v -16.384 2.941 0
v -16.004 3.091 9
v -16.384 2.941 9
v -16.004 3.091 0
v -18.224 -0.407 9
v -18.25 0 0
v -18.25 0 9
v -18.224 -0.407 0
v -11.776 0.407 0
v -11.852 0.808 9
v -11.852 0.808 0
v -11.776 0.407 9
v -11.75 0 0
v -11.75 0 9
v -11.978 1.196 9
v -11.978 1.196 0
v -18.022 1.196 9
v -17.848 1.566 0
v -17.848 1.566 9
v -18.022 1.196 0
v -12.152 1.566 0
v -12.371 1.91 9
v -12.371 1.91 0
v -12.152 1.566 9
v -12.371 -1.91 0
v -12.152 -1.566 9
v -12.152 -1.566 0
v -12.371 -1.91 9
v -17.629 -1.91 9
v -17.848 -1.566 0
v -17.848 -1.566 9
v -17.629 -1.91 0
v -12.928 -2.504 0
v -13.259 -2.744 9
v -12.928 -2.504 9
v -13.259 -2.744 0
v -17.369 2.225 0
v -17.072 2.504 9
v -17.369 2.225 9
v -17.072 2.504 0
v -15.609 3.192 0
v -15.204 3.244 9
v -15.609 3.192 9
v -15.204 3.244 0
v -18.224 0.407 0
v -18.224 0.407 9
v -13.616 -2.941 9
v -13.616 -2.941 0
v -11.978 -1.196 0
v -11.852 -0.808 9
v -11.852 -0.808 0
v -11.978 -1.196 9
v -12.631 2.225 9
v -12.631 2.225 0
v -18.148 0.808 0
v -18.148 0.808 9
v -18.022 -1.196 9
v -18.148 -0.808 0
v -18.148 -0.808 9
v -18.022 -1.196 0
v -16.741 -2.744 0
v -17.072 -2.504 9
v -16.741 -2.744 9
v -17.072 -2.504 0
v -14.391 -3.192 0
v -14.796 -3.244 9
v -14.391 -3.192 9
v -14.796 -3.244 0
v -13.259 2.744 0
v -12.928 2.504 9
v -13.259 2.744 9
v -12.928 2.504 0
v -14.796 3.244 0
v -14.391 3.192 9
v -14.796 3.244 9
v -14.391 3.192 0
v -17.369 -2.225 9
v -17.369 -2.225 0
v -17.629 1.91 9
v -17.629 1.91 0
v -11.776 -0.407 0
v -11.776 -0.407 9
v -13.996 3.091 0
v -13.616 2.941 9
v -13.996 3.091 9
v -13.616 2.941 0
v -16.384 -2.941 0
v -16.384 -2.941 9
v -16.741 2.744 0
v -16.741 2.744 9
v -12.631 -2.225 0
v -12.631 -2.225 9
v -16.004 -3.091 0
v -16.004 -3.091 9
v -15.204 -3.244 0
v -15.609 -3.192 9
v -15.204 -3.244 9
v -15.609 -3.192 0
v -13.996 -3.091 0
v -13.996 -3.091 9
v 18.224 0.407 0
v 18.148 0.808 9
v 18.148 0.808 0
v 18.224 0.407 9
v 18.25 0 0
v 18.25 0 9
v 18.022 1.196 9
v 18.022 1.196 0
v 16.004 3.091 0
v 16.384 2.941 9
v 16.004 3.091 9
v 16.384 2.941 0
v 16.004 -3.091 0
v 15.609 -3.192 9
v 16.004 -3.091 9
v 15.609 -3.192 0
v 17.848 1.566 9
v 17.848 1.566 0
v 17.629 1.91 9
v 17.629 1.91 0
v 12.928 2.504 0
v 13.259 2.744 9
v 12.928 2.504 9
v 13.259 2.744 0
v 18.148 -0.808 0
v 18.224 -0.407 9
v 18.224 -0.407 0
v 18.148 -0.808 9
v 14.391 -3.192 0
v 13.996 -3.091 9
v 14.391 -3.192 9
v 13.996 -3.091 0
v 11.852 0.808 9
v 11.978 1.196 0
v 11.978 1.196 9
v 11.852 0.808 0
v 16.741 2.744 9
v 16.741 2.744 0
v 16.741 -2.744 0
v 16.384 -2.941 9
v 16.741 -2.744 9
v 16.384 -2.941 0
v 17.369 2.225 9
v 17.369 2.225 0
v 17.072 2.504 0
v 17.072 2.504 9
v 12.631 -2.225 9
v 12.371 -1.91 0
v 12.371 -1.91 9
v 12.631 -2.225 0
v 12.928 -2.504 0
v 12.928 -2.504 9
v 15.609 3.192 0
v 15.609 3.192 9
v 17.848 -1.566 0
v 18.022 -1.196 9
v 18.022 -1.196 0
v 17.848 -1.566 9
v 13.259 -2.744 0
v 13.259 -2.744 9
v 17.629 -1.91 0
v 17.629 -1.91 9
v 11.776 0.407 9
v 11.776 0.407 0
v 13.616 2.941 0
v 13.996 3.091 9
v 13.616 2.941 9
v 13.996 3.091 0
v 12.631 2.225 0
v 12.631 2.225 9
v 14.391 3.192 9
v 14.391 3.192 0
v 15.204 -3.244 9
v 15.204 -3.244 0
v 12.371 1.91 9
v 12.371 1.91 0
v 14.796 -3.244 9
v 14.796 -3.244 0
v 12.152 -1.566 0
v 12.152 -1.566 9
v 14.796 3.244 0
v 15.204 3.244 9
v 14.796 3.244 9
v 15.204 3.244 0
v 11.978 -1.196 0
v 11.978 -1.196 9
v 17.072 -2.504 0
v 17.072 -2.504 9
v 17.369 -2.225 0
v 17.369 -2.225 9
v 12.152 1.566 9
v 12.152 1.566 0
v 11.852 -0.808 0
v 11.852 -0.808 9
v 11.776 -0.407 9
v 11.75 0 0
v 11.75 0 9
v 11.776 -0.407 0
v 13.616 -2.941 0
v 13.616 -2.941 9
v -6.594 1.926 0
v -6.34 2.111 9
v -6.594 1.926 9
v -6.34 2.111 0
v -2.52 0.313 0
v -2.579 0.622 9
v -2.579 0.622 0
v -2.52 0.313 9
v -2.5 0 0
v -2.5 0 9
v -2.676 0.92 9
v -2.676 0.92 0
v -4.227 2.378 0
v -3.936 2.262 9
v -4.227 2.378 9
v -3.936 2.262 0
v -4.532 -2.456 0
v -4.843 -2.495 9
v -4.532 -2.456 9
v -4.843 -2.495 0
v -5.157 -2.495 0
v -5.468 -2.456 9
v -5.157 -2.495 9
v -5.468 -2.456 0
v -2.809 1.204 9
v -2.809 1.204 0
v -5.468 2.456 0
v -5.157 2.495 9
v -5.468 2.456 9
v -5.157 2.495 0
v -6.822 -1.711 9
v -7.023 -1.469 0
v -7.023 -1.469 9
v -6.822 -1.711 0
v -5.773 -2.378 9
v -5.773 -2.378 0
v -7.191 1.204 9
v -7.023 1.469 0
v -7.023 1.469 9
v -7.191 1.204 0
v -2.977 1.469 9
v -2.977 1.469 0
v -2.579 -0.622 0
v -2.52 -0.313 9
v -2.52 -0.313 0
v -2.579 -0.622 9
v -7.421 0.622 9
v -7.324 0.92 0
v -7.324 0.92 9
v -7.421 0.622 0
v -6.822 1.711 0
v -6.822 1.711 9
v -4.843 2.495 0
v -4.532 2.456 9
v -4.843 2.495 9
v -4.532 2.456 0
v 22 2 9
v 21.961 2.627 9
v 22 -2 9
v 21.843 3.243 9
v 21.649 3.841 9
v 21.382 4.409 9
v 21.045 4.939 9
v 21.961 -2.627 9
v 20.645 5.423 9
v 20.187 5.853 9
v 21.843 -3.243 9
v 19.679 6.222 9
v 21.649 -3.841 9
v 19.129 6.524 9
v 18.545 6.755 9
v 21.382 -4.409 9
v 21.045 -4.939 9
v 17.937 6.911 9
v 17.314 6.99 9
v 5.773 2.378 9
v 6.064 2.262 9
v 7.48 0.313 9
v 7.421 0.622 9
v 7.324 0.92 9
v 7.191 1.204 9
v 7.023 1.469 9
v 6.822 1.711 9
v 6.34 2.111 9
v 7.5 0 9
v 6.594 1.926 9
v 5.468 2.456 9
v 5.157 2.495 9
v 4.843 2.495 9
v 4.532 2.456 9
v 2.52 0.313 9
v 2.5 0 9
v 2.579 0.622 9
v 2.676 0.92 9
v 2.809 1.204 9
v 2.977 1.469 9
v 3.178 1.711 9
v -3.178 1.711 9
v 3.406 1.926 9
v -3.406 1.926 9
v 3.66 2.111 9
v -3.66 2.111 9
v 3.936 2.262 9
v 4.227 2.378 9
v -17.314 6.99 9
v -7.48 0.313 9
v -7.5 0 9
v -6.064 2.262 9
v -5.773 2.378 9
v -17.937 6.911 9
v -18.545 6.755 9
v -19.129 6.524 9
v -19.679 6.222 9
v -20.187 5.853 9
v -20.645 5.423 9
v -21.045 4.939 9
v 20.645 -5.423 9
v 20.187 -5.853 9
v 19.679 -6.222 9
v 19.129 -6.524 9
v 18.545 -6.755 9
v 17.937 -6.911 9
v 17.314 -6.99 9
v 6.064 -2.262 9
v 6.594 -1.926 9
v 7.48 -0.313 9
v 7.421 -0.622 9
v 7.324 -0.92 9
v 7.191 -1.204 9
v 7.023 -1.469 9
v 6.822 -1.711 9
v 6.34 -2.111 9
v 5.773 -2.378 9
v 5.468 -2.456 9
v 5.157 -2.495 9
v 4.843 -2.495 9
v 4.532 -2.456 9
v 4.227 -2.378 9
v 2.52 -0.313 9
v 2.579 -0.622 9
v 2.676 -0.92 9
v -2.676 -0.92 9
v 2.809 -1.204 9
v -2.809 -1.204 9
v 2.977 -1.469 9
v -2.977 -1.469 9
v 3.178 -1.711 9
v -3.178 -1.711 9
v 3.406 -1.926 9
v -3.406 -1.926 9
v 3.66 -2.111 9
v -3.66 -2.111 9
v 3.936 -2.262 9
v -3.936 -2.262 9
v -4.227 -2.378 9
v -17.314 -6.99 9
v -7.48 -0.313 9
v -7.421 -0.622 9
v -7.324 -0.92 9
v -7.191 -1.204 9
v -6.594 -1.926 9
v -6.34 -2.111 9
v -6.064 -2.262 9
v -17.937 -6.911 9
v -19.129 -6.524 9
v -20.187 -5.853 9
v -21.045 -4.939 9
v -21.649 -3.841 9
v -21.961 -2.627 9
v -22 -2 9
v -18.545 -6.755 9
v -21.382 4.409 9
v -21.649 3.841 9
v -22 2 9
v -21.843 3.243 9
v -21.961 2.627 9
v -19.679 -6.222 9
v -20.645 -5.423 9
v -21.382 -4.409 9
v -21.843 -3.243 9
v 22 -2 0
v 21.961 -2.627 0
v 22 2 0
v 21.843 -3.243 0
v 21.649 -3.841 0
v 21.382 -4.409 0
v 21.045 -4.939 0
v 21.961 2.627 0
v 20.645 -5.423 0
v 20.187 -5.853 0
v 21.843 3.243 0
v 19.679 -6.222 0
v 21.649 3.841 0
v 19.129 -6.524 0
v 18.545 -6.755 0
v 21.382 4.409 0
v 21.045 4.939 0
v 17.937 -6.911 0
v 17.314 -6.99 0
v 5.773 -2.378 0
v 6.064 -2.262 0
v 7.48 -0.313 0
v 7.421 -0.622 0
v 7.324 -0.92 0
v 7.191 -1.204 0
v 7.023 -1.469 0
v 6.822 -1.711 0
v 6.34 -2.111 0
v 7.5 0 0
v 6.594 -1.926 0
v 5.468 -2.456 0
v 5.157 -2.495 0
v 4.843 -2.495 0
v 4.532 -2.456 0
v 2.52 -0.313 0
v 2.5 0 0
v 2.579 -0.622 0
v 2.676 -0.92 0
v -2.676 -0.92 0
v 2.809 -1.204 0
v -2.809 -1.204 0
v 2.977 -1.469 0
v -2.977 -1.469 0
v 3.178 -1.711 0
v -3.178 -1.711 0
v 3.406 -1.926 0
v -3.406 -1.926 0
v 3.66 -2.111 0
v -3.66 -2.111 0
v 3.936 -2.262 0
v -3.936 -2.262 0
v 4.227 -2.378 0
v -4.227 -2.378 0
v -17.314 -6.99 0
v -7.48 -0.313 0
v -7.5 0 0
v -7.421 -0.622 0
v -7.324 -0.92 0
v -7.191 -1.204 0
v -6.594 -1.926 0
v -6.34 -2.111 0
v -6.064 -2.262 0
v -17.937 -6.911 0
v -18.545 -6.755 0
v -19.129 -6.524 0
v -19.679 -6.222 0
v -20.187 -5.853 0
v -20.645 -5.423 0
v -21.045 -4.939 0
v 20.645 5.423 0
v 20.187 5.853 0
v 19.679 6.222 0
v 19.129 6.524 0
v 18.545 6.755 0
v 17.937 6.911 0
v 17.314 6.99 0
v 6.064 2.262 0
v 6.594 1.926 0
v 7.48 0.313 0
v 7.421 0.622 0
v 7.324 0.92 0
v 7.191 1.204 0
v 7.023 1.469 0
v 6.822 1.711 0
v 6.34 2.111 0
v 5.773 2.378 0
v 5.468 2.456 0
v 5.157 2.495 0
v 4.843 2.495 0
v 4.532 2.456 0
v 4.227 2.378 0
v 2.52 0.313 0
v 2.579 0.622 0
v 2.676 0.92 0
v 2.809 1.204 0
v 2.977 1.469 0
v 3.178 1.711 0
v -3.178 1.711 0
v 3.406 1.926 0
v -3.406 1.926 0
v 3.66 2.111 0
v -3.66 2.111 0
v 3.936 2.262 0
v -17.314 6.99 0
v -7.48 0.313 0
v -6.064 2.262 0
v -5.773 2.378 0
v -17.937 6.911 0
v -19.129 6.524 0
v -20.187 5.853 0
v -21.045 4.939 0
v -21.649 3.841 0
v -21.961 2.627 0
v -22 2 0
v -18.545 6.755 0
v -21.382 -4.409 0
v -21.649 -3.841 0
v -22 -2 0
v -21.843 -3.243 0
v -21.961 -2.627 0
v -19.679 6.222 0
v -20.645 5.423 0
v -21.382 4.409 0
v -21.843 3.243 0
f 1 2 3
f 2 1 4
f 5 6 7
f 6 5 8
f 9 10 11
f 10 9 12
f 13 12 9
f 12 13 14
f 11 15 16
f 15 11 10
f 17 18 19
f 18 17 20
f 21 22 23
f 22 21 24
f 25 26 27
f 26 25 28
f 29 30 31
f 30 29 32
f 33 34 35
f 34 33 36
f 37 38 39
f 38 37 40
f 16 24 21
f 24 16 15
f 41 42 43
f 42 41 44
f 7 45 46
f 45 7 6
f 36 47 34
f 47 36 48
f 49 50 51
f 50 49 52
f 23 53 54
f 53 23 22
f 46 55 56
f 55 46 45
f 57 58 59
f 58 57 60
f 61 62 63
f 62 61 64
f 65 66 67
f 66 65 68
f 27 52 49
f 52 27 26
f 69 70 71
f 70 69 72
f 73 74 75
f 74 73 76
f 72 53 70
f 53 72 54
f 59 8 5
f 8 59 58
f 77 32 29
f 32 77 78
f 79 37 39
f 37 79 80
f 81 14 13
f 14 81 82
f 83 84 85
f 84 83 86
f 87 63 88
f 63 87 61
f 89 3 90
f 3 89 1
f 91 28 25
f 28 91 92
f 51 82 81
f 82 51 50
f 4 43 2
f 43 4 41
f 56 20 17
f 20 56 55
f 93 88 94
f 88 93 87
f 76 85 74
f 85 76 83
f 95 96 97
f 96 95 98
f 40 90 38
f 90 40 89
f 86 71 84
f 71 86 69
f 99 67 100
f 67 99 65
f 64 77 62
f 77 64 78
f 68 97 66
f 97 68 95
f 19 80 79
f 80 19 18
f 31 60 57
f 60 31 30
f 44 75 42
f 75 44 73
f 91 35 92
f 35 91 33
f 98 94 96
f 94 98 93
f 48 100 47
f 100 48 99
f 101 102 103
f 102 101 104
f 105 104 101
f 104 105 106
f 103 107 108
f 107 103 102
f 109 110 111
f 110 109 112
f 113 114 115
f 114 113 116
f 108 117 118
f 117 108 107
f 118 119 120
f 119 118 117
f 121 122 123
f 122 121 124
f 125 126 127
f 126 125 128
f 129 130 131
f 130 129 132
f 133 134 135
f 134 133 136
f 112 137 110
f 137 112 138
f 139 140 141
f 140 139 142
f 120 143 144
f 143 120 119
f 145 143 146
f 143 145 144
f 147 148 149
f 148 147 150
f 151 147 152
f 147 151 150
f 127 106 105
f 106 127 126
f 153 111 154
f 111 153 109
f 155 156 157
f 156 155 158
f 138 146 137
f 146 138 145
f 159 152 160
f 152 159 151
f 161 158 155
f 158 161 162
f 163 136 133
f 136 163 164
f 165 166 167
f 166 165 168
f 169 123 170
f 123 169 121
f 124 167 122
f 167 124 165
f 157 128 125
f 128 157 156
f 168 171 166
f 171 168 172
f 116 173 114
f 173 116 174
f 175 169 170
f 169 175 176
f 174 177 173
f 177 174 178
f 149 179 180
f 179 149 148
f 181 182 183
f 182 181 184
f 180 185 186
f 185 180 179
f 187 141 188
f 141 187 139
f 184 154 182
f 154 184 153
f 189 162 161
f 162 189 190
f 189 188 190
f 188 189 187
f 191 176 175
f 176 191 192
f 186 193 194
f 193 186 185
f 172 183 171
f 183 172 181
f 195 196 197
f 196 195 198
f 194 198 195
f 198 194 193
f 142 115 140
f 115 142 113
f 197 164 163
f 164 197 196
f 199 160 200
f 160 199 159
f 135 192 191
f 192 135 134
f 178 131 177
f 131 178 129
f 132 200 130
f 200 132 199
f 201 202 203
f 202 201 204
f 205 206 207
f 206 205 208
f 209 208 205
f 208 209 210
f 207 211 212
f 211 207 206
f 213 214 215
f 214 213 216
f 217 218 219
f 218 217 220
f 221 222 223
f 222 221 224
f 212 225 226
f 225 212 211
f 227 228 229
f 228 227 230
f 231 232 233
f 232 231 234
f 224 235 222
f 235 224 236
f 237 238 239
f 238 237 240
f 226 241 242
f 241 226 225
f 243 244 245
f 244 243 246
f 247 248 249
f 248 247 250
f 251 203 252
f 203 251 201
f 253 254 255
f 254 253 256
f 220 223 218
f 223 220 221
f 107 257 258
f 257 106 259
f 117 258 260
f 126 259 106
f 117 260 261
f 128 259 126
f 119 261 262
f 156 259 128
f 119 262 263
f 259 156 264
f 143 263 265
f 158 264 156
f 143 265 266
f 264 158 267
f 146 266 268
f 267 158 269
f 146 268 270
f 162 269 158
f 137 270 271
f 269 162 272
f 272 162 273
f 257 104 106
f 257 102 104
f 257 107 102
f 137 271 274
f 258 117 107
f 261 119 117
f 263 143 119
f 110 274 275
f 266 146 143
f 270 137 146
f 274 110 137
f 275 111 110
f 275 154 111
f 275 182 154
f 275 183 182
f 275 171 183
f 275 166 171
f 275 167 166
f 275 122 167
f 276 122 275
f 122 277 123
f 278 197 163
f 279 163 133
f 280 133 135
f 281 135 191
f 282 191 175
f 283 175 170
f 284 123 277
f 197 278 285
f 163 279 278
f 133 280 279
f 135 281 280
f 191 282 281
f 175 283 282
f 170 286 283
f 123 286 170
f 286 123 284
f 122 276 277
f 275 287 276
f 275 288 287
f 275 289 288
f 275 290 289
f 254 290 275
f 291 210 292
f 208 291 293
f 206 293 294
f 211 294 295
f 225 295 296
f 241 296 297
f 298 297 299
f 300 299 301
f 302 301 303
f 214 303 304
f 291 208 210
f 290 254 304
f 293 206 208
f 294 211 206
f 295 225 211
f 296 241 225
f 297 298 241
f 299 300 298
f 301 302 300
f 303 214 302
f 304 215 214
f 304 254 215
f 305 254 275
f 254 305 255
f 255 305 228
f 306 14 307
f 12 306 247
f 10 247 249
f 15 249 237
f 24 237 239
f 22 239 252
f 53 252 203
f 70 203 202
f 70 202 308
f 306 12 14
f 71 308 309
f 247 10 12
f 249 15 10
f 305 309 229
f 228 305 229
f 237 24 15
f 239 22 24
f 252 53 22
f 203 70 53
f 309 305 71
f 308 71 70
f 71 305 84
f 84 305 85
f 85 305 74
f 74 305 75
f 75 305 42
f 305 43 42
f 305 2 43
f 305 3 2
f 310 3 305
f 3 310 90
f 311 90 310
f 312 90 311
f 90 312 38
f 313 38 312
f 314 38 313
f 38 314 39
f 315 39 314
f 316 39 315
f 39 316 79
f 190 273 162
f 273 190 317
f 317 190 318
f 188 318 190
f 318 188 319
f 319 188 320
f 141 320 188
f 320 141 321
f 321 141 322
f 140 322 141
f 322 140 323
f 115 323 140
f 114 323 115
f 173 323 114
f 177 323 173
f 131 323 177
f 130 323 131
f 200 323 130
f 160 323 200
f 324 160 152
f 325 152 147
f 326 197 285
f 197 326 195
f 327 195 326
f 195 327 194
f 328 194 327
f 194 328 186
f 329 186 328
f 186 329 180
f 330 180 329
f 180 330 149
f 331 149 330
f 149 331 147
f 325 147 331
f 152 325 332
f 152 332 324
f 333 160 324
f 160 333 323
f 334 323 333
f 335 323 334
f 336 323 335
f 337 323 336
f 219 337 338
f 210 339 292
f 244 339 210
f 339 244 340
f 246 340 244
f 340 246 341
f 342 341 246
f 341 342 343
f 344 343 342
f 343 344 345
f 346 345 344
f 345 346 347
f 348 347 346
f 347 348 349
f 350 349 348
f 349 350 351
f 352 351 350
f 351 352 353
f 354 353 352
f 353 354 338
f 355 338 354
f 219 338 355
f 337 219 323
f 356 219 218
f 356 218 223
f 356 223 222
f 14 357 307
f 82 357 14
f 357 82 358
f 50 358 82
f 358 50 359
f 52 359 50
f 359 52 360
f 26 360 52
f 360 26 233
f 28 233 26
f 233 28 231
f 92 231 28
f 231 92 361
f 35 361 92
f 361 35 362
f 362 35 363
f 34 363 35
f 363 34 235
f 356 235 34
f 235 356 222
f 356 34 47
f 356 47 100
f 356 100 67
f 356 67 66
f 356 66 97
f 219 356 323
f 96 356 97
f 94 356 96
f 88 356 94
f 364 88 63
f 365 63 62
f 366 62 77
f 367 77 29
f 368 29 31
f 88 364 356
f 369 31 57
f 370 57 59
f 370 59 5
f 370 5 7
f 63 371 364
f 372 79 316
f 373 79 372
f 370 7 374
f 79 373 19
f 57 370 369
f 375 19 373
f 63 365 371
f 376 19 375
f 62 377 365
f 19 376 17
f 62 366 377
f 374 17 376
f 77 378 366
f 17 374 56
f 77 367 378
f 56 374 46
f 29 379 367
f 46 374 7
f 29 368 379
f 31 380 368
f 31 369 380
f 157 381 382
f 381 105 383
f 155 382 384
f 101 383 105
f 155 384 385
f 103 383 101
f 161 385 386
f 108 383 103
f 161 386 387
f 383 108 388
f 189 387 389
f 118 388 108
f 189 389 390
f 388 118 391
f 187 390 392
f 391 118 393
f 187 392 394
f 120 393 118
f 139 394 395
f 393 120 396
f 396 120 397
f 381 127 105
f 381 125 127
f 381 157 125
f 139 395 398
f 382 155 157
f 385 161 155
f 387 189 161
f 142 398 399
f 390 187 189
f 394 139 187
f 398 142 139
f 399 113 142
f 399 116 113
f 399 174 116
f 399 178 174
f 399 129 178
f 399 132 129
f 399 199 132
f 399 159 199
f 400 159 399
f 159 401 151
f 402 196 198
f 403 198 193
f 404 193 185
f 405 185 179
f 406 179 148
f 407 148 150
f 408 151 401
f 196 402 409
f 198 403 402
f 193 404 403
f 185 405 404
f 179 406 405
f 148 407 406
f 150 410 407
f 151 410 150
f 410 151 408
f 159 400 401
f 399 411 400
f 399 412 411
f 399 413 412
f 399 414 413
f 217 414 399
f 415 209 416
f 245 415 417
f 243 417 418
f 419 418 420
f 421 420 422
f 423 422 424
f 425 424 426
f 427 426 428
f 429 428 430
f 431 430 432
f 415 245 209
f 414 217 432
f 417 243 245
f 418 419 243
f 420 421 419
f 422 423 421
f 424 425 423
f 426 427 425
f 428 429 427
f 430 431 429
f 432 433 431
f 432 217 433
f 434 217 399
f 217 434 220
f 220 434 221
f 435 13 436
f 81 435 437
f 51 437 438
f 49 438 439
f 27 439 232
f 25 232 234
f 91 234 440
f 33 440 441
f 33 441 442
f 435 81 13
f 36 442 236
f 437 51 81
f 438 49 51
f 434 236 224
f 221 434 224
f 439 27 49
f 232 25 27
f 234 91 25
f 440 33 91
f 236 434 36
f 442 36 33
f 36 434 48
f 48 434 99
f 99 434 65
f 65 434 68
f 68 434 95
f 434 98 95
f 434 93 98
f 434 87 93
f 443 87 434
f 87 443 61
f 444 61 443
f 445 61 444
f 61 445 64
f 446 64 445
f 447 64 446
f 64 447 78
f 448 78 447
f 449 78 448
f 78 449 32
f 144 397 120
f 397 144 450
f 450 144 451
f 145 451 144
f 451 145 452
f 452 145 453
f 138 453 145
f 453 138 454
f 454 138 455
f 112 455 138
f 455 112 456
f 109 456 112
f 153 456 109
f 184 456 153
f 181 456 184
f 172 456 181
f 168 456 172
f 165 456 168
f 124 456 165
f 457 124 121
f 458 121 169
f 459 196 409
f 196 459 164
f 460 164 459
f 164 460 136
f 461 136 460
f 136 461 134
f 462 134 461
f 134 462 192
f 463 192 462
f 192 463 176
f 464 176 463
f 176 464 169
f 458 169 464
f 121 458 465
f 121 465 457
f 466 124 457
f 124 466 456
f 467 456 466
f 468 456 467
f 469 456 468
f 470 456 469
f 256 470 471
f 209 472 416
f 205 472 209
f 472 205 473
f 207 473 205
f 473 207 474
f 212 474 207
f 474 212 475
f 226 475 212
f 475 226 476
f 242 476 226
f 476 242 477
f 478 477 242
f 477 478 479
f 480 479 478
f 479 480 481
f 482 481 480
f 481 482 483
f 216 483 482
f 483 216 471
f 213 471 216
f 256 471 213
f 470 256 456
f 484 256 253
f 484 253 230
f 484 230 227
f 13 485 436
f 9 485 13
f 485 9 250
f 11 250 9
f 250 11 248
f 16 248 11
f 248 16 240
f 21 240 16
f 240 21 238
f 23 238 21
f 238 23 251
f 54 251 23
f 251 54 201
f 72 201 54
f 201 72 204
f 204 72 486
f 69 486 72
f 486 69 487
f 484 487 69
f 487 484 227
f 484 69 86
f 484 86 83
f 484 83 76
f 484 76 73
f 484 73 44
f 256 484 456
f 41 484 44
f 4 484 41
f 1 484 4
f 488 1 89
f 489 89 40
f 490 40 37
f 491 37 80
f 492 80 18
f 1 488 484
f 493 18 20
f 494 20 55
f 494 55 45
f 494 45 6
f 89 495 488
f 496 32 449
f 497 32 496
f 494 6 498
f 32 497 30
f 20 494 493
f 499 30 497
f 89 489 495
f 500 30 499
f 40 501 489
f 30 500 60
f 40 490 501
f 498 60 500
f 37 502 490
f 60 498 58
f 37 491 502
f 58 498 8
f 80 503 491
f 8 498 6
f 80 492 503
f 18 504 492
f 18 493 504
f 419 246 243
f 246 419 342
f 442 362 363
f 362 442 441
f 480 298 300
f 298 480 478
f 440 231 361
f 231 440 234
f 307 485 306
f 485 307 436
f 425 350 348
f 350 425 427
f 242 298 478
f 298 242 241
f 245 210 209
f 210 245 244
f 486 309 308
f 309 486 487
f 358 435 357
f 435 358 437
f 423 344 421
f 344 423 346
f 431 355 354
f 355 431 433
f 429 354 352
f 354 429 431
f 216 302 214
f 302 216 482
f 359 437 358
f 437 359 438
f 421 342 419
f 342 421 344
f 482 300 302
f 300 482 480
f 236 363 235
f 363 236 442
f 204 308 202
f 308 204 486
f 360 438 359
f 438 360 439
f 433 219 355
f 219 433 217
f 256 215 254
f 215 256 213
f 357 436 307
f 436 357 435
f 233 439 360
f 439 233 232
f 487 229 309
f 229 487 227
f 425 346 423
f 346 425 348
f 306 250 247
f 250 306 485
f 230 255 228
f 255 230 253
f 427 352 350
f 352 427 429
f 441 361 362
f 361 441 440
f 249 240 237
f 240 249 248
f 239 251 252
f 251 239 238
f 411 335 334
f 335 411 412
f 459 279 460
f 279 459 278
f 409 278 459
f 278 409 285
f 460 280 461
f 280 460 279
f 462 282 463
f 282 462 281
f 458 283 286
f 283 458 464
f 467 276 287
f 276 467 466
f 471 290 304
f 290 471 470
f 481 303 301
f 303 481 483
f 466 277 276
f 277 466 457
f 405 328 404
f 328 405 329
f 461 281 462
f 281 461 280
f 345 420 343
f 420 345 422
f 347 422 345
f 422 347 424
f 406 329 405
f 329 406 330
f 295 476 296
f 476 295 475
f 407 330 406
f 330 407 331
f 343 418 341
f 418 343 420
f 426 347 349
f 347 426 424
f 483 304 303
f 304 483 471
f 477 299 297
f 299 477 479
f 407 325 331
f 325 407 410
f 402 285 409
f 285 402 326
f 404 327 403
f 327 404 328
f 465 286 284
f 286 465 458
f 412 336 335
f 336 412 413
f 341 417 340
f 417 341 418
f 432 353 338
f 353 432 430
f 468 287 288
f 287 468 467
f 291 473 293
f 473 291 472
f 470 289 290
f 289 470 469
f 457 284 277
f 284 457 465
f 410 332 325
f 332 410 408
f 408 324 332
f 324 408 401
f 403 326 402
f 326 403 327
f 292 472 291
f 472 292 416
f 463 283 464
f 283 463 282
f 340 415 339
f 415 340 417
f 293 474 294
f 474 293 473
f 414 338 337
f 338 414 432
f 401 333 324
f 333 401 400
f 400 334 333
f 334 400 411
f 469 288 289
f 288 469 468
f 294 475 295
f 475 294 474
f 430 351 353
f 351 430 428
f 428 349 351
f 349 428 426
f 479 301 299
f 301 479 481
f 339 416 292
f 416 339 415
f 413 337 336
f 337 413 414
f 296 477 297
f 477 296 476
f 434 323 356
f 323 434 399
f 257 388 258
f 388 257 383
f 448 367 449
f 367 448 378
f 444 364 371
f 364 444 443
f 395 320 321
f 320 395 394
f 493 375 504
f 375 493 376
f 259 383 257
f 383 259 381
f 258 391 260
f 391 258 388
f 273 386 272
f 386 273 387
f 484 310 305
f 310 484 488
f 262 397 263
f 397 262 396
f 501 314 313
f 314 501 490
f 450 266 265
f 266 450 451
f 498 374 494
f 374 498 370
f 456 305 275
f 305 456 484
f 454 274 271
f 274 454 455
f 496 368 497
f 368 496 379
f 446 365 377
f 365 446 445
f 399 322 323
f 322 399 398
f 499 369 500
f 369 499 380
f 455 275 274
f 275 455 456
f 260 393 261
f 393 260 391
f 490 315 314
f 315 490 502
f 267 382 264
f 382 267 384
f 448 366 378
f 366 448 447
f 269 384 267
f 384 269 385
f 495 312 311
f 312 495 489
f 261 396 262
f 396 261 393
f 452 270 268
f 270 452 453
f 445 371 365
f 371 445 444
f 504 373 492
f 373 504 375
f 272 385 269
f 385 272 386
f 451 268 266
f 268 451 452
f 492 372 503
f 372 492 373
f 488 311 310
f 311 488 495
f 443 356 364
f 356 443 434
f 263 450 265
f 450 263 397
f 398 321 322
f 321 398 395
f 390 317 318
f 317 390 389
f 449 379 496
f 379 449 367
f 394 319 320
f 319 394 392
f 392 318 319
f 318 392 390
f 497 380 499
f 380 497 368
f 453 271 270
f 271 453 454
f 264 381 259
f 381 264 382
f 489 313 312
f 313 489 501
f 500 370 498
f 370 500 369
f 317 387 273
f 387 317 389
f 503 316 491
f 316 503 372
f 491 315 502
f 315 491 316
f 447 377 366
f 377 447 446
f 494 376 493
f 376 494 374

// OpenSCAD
$fn = 50;


difference() {
	union() {
		hull() {
			translate(v = [-17.0000000000, 2.0000000000, 0]) {
				cylinder(h = 9, r = 5);
			}
			translate(v = [17.0000000000, 2.0000000000, 0]) {
				cylinder(h = 9, r = 5);
			}
			translate(v = [-17.0000000000, -2.0000000000, 0]) {
				cylinder(h = 9, r = 5);
			}
			translate(v = [17.0000000000, -2.0000000000, 0]) {
				cylinder(h = 9, r = 5);
			}
		}
	}
	union() {
		#translate(v = [-15.0000000000, 0.0000000000, -100.0000000000]) {
			cylinder(h = 200, r = 3.2500000000);
		}
		#translate(v = [-15.0000000000, 0.0000000000, -100.0000000000]) {
			cylinder(h = 200, r = 3.2500000000);
		}
		#translate(v = [15.0000000000, 0.0000000000, -100.0000000000]) {
			cylinder(h = 200, r = 3.2500000000);
		}
		#translate(v = [15.0000000000, 0.0000000000, -100.0000000000]) {
			cylinder(h = 200, r = 3.2500000000);
		}
		#translate(v = [-15.0000000000, 0, 0]) {
			cylinder(h = 9, r = 2.5000000000);
		}
		#translate(v = [-5.0000000000, 0, 0]) {
			cylinder(h = 9, r = 2.5000000000);
		}
		#translate(v = [5.0000000000, 0, 0]) {
			cylinder(h = 9, r = 2.5000000000);
		}
		#translate(v = [15.0000000000, 0, 0]) {
			cylinder(h = 9, r = 2.5000000000);
		}
	}
}
